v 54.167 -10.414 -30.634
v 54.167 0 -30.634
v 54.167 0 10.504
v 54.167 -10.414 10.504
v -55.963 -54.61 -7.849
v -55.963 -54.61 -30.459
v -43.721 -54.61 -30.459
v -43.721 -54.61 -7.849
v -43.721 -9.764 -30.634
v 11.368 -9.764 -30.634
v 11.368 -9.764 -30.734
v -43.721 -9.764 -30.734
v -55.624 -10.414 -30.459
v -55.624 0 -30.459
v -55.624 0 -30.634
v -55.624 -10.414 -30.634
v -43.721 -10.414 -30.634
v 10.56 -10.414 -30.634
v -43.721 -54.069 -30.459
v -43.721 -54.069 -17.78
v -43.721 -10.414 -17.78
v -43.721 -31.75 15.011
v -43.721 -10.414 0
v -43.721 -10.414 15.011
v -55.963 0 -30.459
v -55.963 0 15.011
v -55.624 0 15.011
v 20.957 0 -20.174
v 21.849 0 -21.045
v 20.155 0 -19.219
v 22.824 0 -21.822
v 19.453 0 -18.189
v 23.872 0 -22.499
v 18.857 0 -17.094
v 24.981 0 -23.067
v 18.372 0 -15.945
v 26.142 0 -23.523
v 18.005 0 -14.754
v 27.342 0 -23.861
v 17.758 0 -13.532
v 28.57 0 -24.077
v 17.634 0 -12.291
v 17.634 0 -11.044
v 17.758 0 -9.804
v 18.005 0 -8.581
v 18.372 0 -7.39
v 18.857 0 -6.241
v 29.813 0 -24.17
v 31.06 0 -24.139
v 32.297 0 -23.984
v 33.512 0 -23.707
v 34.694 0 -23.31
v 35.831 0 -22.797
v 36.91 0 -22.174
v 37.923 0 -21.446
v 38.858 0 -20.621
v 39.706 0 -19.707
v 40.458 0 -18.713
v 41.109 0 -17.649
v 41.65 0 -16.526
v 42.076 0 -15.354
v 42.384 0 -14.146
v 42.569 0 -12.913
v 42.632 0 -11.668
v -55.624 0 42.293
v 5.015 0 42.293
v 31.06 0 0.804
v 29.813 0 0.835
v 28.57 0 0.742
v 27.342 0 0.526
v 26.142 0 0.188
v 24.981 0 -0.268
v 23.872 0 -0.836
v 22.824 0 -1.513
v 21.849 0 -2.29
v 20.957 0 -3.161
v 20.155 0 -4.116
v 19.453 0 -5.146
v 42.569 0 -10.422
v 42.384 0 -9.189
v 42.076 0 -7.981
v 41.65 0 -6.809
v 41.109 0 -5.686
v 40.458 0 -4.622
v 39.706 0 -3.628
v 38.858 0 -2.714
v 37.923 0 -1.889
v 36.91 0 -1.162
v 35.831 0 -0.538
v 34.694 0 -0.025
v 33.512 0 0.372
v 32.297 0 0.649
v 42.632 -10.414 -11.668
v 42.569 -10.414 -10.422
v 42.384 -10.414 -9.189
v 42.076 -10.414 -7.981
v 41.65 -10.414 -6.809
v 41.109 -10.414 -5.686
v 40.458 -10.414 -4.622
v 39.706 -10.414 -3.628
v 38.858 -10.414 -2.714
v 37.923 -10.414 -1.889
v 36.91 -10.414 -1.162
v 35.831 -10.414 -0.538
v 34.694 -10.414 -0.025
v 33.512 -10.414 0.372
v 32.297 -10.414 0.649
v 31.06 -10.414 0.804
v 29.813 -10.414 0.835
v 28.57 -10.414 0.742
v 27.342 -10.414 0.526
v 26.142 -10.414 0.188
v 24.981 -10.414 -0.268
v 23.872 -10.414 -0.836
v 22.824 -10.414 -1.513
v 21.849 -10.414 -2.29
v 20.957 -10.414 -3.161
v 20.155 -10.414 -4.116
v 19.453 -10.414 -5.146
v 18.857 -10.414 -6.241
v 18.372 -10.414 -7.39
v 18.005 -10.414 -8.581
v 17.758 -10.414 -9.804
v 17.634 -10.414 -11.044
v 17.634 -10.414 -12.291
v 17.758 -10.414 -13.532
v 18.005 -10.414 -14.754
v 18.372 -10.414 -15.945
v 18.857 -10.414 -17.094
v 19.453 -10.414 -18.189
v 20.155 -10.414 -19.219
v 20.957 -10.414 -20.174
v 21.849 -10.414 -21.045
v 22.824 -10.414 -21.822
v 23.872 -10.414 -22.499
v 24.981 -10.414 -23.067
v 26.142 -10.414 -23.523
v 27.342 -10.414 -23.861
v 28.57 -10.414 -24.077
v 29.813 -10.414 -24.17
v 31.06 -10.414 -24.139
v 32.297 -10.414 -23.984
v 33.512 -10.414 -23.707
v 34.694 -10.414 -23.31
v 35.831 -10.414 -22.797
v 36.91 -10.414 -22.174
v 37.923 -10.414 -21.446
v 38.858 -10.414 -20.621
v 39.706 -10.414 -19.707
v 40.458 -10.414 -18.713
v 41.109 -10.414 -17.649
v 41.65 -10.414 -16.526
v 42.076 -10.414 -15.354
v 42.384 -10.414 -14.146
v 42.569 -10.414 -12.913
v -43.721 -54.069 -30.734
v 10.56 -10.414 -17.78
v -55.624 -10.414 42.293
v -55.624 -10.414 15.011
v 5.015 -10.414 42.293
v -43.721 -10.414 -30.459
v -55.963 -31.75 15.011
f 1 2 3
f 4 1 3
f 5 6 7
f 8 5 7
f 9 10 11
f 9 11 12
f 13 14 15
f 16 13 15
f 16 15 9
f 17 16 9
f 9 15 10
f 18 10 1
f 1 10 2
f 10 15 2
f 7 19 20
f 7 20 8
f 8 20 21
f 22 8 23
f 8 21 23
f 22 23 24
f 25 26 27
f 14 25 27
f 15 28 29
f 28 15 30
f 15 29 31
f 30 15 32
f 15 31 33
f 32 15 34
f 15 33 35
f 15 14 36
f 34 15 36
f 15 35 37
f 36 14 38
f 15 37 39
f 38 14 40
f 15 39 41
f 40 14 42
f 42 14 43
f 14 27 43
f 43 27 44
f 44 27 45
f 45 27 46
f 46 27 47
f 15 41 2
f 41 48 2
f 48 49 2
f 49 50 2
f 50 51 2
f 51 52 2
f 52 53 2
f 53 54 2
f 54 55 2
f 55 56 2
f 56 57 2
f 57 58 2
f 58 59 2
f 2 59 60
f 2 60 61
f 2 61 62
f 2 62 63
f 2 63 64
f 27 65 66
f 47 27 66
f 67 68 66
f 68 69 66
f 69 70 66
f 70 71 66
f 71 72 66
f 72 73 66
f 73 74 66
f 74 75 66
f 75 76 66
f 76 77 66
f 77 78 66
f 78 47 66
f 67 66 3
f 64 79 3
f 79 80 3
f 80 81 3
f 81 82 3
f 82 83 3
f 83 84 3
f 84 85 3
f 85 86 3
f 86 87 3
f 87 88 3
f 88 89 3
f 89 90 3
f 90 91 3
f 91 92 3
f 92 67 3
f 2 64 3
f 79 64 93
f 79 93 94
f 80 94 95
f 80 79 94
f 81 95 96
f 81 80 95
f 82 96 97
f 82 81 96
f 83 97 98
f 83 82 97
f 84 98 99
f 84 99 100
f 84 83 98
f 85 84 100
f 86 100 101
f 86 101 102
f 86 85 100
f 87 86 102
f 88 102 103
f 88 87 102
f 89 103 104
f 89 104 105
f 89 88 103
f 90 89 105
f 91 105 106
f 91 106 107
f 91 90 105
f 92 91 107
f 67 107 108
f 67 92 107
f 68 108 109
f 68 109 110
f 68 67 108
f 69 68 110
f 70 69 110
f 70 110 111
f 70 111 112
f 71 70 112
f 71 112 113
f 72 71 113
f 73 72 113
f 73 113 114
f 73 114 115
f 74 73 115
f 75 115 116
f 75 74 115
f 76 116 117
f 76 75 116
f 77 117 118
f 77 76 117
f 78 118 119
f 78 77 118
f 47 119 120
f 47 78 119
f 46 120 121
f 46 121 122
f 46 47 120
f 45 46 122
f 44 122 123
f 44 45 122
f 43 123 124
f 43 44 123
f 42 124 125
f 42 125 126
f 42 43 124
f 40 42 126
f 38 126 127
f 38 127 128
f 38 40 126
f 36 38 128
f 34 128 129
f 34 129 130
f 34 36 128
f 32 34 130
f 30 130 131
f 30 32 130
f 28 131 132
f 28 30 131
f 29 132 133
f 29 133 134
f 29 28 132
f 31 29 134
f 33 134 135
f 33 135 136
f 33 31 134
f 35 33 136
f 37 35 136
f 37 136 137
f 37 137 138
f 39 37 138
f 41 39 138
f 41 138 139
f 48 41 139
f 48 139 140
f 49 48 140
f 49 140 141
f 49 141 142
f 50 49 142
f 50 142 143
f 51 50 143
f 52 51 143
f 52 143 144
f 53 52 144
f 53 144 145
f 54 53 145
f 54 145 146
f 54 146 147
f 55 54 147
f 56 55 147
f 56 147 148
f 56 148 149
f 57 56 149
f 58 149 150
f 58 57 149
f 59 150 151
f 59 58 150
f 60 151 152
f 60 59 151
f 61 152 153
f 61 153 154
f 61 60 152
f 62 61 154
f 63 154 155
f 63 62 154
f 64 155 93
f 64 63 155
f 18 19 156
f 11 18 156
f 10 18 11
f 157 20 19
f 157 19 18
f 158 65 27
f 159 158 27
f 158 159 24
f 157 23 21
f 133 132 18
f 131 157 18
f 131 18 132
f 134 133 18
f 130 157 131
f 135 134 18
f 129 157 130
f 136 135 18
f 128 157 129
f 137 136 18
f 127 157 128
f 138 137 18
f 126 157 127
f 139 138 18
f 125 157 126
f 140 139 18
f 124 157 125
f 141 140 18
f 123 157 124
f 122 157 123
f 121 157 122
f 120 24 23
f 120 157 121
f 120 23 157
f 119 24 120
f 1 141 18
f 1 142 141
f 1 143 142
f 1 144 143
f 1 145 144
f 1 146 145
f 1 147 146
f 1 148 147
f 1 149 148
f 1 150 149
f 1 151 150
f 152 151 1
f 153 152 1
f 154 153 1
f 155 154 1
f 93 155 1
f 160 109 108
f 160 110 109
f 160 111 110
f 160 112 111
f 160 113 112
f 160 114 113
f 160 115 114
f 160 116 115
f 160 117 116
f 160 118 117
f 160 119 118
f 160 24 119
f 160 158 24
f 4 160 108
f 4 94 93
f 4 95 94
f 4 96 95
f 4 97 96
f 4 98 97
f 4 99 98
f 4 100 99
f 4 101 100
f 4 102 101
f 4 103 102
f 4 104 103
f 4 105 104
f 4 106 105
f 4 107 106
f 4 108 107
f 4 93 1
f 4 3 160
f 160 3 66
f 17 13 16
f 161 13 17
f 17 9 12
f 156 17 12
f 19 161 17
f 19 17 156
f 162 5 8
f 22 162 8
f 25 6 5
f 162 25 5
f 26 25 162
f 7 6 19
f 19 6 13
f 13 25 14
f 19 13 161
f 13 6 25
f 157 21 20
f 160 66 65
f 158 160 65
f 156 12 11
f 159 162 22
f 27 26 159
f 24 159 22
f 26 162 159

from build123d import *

# Parameters (mm, degrees)
F0_R      = 12.5067254218
F1_DEPTH  = 10.414
F2_W      = 12.2419670224
F2_H      = 45.4701641575
F3_DEPTH  = 54.61
F4_SIZE   = 22.86
F6_DEPTH  = 30.734
F8_DEPTH  = 17.78
F9_W      = 56.2547529116
F9_H      = 22.1521309577
F10_DEPTH = 10.414


# Not quite as in the source:
# - a feature names something its author has since deleted; it is built from what else it names


with BuildPart() as f1:
    # F0 (on Front) → F1 (new body)
    with BuildSketch(Plane.XZ):
        Polygon((5.0146179641, 42.2928149286), (-55.6240000051, 42.2928149286), (-55.6240000051, -30.6337999585), (54.1666180116, -30.6337999585), (54.1666180116, 10.5042919132), align=None)
        with Locations((30.1248802542, -11.6675363407)):
            Circle(F0_R, mode=Mode.SUBTRACT)
    extrude(amount=F1_DEPTH)

    # F2 (on Front) → F3 (join)
    with BuildSketch(Plane.XZ):
        with Locations((-49.8422943056, -7.7240983956)):
            Rectangle(F2_W, F2_H)
    extrude(amount=F3_DEPTH)

    # F4
    f4_edges = [f1.edges().sort_by_distance(p)[0] for p in [
        (-49.842294, -54.61, 15.010984),
    ]]
    chamfer(f4_edges, length=F4_SIZE)

    # F5 (on Top) → F6 (join)
    with BuildSketch(Plane.XY):
        Polygon((11.3675408065, -9.7644263878), (-43.7213107944, -9.7644263878), (-43.7213107944, -54.0686920285), align=None)
    extrude(amount=-F6_DEPTH)

    # F7 (on Top) → F8 (cut)
    with BuildSketch(Plane.XY):
        Polygon((11.3675408065, -10.3473765776), (-43.7213107944, -10.3473765776), (-43.7213107944, -55.2345886827), align=None)
    extrude(amount=-F8_DEPTH, mode=Mode.SUBTRACT)

    # F9 (on Front) → F10 (join)
    with BuildSketch(Plane.XZ):
        with Locations((-15.5939343385, -6.8496719468)):
            Rectangle(F9_W, F9_H)
    extrude(amount=F10_DEPTH)


solid = f1.part
